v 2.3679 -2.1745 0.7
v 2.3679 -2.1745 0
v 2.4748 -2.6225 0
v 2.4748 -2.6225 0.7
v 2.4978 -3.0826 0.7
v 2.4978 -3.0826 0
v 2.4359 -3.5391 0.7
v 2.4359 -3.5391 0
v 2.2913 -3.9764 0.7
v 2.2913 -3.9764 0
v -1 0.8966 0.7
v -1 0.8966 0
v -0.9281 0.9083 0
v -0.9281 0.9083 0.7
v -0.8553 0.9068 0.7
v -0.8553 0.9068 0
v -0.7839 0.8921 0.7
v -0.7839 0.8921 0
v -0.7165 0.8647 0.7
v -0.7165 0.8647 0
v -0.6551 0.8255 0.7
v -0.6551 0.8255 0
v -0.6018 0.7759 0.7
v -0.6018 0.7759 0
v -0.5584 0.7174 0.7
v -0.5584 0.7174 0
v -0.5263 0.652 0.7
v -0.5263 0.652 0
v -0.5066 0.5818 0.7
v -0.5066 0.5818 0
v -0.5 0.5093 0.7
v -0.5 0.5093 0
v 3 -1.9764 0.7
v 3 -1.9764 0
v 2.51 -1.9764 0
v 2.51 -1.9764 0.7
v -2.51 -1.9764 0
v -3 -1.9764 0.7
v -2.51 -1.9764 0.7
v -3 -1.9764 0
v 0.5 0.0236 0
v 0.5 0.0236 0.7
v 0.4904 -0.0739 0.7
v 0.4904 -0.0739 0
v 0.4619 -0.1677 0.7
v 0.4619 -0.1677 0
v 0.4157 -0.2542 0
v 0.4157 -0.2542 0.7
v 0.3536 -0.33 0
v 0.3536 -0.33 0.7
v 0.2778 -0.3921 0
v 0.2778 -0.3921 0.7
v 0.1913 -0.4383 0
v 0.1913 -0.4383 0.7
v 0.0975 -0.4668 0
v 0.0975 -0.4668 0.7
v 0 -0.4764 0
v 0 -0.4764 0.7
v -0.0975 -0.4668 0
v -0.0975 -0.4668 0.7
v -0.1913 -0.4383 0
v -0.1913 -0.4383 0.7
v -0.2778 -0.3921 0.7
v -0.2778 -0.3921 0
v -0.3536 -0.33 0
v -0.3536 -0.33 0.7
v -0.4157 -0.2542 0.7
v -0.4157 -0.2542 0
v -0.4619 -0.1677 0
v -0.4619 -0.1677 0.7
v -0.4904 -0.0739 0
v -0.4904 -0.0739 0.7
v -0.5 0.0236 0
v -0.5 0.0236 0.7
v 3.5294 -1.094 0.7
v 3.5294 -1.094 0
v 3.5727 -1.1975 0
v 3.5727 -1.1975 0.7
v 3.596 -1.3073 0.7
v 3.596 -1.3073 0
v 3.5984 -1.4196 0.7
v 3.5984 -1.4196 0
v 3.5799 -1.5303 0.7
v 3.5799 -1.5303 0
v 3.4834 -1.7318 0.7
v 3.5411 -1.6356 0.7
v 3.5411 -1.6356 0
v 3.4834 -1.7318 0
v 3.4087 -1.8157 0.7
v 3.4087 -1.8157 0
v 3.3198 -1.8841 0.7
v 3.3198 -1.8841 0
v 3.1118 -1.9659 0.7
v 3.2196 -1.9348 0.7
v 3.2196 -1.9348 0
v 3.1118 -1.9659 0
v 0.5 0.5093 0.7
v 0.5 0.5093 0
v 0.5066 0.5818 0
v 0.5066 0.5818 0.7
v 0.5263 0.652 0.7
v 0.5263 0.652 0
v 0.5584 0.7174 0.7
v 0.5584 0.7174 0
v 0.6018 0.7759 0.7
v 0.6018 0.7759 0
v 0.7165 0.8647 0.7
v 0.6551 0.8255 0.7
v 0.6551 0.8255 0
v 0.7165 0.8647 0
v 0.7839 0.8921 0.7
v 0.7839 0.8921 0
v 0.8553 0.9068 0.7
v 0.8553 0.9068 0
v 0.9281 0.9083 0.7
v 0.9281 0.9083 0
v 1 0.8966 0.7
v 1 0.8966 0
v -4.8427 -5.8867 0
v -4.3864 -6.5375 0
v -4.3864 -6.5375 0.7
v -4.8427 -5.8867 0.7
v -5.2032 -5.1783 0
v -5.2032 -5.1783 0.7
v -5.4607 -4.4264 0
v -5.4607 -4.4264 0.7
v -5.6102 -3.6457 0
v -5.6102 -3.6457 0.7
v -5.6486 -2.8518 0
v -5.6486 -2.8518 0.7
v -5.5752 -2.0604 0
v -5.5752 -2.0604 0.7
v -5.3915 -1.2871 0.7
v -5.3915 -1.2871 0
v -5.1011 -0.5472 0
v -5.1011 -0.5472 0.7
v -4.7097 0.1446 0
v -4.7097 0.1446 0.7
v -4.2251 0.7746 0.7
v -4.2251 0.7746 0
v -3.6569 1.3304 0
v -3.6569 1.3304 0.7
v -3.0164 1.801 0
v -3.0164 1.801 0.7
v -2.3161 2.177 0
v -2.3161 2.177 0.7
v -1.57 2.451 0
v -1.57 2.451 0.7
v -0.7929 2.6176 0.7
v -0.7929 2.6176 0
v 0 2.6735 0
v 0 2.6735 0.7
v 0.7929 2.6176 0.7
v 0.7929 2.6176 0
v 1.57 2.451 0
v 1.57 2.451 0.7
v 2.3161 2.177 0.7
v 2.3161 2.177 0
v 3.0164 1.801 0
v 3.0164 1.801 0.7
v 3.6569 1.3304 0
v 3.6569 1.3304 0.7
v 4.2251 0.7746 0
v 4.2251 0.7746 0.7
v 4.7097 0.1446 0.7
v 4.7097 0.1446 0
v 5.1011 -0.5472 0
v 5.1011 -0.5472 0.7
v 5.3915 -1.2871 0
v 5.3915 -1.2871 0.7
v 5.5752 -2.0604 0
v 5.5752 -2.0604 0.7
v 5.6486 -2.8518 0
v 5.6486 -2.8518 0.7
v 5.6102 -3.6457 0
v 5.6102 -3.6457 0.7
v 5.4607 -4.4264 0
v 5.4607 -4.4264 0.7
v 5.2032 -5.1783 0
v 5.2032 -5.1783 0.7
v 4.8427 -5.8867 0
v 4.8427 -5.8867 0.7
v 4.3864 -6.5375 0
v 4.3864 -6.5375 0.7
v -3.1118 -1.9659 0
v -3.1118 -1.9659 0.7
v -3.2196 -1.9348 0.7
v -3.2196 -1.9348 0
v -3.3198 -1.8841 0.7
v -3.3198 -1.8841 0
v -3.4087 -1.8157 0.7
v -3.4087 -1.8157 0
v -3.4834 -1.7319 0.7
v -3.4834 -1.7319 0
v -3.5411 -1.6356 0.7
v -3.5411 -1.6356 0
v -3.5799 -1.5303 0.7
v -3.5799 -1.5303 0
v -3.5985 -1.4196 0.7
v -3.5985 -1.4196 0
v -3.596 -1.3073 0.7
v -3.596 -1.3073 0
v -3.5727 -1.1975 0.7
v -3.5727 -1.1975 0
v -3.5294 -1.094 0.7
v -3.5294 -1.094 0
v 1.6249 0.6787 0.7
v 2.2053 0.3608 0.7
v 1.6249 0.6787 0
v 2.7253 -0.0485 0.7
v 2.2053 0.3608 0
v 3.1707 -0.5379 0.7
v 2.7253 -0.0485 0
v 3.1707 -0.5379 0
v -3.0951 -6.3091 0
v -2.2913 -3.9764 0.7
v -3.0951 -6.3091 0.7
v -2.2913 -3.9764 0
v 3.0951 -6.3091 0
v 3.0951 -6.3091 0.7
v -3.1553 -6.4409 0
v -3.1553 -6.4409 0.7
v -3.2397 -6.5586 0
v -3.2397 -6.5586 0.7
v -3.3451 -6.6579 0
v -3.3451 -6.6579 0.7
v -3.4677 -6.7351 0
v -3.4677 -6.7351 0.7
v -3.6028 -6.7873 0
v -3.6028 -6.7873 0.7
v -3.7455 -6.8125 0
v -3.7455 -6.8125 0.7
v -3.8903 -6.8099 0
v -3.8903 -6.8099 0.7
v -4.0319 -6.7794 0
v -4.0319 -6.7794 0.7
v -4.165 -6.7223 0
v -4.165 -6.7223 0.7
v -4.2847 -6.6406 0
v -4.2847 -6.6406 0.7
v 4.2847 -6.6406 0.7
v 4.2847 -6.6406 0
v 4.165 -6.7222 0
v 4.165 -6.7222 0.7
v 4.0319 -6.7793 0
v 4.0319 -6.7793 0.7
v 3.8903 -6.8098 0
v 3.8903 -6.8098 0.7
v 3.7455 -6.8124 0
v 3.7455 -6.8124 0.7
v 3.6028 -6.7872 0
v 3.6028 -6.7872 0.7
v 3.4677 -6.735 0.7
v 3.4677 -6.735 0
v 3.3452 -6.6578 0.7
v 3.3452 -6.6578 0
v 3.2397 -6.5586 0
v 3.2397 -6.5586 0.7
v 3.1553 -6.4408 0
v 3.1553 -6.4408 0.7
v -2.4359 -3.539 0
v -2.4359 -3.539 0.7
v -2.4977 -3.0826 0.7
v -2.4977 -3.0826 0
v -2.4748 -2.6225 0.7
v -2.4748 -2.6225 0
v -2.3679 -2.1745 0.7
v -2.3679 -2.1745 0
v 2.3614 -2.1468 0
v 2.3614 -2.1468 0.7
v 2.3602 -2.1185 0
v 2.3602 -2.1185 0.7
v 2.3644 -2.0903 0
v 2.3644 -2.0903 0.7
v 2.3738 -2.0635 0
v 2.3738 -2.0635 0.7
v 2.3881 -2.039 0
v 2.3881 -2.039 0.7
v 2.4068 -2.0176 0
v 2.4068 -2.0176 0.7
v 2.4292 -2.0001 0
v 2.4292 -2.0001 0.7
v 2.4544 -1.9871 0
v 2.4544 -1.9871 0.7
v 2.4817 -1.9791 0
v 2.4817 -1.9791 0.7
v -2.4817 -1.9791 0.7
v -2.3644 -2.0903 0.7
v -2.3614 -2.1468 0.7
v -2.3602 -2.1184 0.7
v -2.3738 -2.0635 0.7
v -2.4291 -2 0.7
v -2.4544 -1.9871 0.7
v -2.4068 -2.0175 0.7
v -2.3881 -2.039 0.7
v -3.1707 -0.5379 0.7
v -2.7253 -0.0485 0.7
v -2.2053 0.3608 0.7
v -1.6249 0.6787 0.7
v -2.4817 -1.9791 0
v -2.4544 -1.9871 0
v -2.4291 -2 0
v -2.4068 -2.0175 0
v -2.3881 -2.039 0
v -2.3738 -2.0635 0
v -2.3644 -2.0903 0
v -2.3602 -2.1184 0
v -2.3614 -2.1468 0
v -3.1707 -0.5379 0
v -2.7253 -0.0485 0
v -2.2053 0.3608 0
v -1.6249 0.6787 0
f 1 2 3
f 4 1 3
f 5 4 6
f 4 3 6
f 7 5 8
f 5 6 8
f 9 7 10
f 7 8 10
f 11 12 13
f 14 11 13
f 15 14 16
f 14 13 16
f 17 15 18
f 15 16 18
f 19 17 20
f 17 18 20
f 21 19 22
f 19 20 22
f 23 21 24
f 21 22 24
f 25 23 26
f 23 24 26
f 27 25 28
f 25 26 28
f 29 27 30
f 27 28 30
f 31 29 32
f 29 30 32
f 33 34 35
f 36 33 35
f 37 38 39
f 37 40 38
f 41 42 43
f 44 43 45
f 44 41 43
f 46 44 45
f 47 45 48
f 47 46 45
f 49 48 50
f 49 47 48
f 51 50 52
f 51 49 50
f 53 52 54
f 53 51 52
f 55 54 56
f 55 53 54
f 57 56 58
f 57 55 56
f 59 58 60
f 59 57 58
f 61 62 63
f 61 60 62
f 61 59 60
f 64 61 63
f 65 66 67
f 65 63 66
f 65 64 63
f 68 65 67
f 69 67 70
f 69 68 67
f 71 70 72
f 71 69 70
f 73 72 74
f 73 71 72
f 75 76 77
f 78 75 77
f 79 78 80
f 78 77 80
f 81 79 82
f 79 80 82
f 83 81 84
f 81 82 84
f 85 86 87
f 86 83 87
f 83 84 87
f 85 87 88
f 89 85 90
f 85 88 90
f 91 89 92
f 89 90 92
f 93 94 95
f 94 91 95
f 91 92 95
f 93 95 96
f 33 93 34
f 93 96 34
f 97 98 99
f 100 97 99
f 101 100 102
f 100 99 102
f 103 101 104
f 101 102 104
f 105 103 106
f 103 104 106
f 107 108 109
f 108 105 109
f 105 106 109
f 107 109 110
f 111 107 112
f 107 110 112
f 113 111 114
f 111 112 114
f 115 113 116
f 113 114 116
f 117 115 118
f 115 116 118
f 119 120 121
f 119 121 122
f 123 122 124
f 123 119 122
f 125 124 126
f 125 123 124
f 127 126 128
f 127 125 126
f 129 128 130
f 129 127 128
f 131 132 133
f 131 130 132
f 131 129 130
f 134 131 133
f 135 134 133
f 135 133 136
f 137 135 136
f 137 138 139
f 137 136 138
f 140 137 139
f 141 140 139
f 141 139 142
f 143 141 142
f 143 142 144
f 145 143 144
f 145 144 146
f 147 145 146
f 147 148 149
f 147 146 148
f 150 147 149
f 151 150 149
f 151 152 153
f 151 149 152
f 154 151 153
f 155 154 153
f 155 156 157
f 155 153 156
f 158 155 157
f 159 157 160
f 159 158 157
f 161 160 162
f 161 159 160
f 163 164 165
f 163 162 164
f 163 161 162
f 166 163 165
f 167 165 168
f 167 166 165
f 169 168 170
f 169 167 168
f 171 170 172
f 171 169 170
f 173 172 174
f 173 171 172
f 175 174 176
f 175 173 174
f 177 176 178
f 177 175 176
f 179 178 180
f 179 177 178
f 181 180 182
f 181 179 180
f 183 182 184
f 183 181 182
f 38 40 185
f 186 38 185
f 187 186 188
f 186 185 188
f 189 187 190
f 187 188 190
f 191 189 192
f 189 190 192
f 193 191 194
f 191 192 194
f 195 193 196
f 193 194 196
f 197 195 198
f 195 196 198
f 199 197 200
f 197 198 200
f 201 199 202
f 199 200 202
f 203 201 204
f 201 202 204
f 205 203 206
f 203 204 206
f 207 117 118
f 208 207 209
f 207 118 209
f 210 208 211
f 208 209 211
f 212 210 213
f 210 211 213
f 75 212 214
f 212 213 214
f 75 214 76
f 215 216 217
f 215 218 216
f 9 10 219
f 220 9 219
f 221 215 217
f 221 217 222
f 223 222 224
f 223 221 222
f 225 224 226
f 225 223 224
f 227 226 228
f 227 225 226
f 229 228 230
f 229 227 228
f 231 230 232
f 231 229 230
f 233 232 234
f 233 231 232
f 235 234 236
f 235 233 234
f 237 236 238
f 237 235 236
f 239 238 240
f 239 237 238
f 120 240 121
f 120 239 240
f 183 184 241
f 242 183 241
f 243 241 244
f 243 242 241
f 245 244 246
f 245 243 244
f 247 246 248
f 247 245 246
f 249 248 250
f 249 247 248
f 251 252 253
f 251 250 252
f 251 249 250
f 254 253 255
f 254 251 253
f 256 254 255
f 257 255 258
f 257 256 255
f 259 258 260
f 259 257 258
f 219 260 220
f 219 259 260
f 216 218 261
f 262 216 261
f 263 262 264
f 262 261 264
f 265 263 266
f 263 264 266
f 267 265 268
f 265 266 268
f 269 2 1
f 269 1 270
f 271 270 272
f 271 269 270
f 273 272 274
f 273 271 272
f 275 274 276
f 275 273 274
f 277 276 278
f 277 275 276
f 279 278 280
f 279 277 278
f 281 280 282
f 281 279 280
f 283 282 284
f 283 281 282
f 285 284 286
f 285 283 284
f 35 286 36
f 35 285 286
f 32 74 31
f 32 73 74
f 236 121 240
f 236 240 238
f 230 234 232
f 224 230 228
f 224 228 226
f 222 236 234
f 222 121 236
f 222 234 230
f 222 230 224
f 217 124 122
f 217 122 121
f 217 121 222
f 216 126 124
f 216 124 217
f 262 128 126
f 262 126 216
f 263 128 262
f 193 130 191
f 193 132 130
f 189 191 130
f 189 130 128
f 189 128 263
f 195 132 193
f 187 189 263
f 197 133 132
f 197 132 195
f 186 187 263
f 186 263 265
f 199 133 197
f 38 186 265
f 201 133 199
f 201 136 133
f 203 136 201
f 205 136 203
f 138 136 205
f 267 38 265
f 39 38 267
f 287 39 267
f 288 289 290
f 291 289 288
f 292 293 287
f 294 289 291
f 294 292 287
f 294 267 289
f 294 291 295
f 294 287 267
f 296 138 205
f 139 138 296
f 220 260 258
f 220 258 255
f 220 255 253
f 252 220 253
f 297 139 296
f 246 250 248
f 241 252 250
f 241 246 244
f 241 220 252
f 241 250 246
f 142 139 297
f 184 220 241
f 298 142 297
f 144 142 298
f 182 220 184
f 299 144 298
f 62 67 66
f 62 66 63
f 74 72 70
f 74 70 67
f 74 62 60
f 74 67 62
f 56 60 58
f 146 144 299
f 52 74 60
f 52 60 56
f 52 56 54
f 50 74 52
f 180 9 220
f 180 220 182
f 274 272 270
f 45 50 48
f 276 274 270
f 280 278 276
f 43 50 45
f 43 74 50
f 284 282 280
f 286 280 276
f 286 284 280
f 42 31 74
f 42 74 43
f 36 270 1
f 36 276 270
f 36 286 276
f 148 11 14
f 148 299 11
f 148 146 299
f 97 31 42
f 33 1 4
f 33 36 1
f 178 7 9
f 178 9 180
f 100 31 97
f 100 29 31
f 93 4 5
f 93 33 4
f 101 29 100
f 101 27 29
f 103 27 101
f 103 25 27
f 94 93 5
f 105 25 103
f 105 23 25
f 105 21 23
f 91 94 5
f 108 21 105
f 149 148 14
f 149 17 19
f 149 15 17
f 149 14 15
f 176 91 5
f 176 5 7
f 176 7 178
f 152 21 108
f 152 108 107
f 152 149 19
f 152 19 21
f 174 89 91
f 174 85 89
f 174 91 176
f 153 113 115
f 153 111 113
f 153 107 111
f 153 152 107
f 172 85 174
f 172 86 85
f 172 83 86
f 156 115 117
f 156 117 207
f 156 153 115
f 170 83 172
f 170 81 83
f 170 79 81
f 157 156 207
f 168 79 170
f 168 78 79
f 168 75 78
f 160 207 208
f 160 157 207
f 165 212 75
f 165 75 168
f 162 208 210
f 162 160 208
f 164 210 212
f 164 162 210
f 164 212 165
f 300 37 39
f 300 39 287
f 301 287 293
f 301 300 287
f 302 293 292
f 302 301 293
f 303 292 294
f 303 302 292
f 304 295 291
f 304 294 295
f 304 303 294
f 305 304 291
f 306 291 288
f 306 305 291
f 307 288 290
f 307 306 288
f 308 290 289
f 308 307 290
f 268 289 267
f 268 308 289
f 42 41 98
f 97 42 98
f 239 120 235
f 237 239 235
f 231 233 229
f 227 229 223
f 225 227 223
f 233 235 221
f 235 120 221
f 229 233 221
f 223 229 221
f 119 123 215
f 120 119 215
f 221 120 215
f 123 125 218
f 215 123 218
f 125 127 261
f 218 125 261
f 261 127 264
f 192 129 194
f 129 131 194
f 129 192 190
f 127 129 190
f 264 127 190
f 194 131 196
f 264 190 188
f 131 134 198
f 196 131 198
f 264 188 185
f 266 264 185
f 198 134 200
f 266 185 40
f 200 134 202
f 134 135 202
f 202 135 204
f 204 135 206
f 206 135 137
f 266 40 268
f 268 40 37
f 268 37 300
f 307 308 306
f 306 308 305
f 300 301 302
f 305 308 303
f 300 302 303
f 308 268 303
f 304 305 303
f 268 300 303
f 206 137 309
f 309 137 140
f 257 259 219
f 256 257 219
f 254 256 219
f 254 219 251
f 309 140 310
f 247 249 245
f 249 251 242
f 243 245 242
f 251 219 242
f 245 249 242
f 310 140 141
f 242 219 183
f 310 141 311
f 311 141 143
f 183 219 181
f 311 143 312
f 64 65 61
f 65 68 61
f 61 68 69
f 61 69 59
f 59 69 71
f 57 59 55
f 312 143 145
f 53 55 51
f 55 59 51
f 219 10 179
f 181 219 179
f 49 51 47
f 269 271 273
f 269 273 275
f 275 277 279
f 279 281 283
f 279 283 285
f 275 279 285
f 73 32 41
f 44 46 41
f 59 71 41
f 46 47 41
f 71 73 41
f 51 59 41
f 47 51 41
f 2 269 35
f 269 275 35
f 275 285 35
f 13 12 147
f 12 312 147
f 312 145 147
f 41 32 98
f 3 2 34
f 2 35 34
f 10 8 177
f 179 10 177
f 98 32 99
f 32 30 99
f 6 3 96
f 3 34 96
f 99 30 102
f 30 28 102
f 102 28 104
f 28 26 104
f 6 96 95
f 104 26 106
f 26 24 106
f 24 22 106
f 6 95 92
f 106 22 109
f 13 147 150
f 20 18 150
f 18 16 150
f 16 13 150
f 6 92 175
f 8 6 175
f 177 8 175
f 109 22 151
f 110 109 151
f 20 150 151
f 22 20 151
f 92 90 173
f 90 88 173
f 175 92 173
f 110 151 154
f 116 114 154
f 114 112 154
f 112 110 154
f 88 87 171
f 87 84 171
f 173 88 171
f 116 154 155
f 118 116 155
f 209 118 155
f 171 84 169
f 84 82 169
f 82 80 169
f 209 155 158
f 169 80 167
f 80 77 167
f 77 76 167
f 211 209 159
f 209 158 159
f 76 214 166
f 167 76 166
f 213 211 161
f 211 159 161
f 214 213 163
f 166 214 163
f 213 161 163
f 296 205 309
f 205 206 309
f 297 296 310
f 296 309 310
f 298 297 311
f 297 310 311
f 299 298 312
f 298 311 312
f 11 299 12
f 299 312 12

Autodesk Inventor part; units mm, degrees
ref_plane "YZ Plane" through (0, 0, 0) normal (1, 0, 0) x (0, 1, 0)
ref_plane "XZ Plane" through (0, 0, 0) normal (0, 1, 0) x (-1, 0, 0)
sketch "Sketch1" plane through (0, 0, 0) normal (0, 0, 1) x (1, 0, 0)
  circle A0 centre (0, -2.9764) radius 3 construction
  line L0 (-0.5, 0.0236) -> (0, 0.0236) construction
  line L1 (-3.206, 0) -> (3.4858, 0) projected
  line L2 (-2.2913, -3.9764) -> (2.2913, -3.9764) construction
  arc A1 (-2.3679, -2.1745) -> (-2.2913, -3.9764) centre (0, -2.9764) ccw
  line L3 (0, 1.949) -> (0, -3.4788) projected
  arc A2 (-0.5, 0.0236) -> (0.5, 0.0236) centre (0, 0.0236) ccw
  arc A3 (4.3864, -6.5375) -> (-4.3864, -6.5375) centre (0, -2.9764) ccw
  line L4 (-3, -1.9764) -> (-2.51, -1.9764)
  line L5 (-0.5, 0.0236) -> (-0.5, 0.5093)
  arc A4 (-1, 0.8966) -> (-3.5294, -1.094) centre (0, -2.9764) ccw
  arc A5 (-0.5, 0.5093) -> (-1, 0.8966) centre (-0.9, 0.5093) ccw
  arc A6 (-3.5294, -1.094) -> (-3, -1.9764) centre (-3, -1.3764) ccw
  arc A7 (-2.3679, -2.1745) -> (-2.51, -1.9764) centre (-2.51, -2.1264) ccw
  line L6 (0, 2.6736) -> (2.5298, 2.6736) construction
  line L7 (-2.2913, -3.9764) -> (-3.0951, -6.3091)
  arc A8 (-4.3864, -6.5375) -> (-3.0951, -6.3091) centre (-3.8041, -6.0648) ccw
  line L8 (0, -0.4764) -> (-1.2778, -0.4764) construction
  line L9 (2.2913, -3.9764) -> (3.0951, -6.3091)
  arc A9 (3.0951, -6.3091) -> (4.3864, -6.5375) centre (3.8041, -6.0648) ccw
  arc A10 (2.2913, -3.9764) -> (2.3679, -2.1745) centre (0, -2.9764) ccw
  line L10 (3, -1.9764) -> (2.51, -1.9764)
  line L11 (0.5, 0.0236) -> (0.5, 0.5093)
  arc A11 (3.5294, -1.094) -> (1, 0.8966) centre (0, -2.9764) ccw
  arc A12 (1, 0.8966) -> (0.5, 0.5093) centre (0.9, 0.5093) ccw
  arc A13 (3, -1.9764) -> (3.5294, -1.094) centre (3, -1.3764) ccw
  arc A14 (2.51, -1.9764) -> (2.3679, -2.1745) centre (2.51, -2.1264) ccw
  point P0 (0.5, 0.0236)
  dimension "d0" = 6
  dimension "d3" = 1
  dimension "d4" = 0.5
  dimension "d5" = 11.3
  dimension "d8" = 4
  dimension "d9" = 1
  dimension "d10" = 0.4
  dimension "d11" = 0.6
  dimension "d12" = 0.15
  dimension "d13" = 0.75
  dimension "d14" = 2.5
  dimension "d15" = 2.5
extrude "Body" add sketch "Sketch1" along normal blind 0.7 contours A4 A6 L4 A7 A1 L7 A8 A3 A9 L9 A10 A14 L10 A13 A11 A12 L11 A2 L1 L5 A5 | L1 L3 A2 | L1 A2 L3
ref_plane "Work Plane1" through (0, -2.9764, 0) normal (-1, 0, 0) x (0, 0, 1)
equation "\"d0\" = WD"
equation "\"d3\" = 0.2 * ND"
equation "\"d4\" = 0.1 * ND"
equation "\"d5\" = SD2"
equation "\"d8\" = 0.8 * ND"
equation "\"d9\" = 0.2 * ND"
equation "\"d10\" = 0.08 * ND"
equation "\"d11\" = 0.12 * ND"
equation "\"d12\" = 0.03 * ND"
equation "\"d13\" = 0.15 * ND"
equation "\"d14\" = 0.5 * ND"
equation "\"d15\" = 0.5 * ND"
equation "\"d16\" = SD"
equation "\"ND\" = 5"
equation "\"SD\" = 0.7"
equation "\"WD\" = 6"
equation "\"d1\" = 1.6 * ND"
equation "\"d2\" = ND"
equation "\"SD2\" = 11.3"
equation "\"d6\" = ND"
equation "\"d7\" = 0.15 * ND"
equation "\"WDMIN\" = 5"
equation "\"SNB\" = 0.74"
equation "\"WDMAX\" = 7"
equation "\"BUBRMI\" = 1.2"
properties part number "DIN 6799 - 5" material "Steel, Mild"
